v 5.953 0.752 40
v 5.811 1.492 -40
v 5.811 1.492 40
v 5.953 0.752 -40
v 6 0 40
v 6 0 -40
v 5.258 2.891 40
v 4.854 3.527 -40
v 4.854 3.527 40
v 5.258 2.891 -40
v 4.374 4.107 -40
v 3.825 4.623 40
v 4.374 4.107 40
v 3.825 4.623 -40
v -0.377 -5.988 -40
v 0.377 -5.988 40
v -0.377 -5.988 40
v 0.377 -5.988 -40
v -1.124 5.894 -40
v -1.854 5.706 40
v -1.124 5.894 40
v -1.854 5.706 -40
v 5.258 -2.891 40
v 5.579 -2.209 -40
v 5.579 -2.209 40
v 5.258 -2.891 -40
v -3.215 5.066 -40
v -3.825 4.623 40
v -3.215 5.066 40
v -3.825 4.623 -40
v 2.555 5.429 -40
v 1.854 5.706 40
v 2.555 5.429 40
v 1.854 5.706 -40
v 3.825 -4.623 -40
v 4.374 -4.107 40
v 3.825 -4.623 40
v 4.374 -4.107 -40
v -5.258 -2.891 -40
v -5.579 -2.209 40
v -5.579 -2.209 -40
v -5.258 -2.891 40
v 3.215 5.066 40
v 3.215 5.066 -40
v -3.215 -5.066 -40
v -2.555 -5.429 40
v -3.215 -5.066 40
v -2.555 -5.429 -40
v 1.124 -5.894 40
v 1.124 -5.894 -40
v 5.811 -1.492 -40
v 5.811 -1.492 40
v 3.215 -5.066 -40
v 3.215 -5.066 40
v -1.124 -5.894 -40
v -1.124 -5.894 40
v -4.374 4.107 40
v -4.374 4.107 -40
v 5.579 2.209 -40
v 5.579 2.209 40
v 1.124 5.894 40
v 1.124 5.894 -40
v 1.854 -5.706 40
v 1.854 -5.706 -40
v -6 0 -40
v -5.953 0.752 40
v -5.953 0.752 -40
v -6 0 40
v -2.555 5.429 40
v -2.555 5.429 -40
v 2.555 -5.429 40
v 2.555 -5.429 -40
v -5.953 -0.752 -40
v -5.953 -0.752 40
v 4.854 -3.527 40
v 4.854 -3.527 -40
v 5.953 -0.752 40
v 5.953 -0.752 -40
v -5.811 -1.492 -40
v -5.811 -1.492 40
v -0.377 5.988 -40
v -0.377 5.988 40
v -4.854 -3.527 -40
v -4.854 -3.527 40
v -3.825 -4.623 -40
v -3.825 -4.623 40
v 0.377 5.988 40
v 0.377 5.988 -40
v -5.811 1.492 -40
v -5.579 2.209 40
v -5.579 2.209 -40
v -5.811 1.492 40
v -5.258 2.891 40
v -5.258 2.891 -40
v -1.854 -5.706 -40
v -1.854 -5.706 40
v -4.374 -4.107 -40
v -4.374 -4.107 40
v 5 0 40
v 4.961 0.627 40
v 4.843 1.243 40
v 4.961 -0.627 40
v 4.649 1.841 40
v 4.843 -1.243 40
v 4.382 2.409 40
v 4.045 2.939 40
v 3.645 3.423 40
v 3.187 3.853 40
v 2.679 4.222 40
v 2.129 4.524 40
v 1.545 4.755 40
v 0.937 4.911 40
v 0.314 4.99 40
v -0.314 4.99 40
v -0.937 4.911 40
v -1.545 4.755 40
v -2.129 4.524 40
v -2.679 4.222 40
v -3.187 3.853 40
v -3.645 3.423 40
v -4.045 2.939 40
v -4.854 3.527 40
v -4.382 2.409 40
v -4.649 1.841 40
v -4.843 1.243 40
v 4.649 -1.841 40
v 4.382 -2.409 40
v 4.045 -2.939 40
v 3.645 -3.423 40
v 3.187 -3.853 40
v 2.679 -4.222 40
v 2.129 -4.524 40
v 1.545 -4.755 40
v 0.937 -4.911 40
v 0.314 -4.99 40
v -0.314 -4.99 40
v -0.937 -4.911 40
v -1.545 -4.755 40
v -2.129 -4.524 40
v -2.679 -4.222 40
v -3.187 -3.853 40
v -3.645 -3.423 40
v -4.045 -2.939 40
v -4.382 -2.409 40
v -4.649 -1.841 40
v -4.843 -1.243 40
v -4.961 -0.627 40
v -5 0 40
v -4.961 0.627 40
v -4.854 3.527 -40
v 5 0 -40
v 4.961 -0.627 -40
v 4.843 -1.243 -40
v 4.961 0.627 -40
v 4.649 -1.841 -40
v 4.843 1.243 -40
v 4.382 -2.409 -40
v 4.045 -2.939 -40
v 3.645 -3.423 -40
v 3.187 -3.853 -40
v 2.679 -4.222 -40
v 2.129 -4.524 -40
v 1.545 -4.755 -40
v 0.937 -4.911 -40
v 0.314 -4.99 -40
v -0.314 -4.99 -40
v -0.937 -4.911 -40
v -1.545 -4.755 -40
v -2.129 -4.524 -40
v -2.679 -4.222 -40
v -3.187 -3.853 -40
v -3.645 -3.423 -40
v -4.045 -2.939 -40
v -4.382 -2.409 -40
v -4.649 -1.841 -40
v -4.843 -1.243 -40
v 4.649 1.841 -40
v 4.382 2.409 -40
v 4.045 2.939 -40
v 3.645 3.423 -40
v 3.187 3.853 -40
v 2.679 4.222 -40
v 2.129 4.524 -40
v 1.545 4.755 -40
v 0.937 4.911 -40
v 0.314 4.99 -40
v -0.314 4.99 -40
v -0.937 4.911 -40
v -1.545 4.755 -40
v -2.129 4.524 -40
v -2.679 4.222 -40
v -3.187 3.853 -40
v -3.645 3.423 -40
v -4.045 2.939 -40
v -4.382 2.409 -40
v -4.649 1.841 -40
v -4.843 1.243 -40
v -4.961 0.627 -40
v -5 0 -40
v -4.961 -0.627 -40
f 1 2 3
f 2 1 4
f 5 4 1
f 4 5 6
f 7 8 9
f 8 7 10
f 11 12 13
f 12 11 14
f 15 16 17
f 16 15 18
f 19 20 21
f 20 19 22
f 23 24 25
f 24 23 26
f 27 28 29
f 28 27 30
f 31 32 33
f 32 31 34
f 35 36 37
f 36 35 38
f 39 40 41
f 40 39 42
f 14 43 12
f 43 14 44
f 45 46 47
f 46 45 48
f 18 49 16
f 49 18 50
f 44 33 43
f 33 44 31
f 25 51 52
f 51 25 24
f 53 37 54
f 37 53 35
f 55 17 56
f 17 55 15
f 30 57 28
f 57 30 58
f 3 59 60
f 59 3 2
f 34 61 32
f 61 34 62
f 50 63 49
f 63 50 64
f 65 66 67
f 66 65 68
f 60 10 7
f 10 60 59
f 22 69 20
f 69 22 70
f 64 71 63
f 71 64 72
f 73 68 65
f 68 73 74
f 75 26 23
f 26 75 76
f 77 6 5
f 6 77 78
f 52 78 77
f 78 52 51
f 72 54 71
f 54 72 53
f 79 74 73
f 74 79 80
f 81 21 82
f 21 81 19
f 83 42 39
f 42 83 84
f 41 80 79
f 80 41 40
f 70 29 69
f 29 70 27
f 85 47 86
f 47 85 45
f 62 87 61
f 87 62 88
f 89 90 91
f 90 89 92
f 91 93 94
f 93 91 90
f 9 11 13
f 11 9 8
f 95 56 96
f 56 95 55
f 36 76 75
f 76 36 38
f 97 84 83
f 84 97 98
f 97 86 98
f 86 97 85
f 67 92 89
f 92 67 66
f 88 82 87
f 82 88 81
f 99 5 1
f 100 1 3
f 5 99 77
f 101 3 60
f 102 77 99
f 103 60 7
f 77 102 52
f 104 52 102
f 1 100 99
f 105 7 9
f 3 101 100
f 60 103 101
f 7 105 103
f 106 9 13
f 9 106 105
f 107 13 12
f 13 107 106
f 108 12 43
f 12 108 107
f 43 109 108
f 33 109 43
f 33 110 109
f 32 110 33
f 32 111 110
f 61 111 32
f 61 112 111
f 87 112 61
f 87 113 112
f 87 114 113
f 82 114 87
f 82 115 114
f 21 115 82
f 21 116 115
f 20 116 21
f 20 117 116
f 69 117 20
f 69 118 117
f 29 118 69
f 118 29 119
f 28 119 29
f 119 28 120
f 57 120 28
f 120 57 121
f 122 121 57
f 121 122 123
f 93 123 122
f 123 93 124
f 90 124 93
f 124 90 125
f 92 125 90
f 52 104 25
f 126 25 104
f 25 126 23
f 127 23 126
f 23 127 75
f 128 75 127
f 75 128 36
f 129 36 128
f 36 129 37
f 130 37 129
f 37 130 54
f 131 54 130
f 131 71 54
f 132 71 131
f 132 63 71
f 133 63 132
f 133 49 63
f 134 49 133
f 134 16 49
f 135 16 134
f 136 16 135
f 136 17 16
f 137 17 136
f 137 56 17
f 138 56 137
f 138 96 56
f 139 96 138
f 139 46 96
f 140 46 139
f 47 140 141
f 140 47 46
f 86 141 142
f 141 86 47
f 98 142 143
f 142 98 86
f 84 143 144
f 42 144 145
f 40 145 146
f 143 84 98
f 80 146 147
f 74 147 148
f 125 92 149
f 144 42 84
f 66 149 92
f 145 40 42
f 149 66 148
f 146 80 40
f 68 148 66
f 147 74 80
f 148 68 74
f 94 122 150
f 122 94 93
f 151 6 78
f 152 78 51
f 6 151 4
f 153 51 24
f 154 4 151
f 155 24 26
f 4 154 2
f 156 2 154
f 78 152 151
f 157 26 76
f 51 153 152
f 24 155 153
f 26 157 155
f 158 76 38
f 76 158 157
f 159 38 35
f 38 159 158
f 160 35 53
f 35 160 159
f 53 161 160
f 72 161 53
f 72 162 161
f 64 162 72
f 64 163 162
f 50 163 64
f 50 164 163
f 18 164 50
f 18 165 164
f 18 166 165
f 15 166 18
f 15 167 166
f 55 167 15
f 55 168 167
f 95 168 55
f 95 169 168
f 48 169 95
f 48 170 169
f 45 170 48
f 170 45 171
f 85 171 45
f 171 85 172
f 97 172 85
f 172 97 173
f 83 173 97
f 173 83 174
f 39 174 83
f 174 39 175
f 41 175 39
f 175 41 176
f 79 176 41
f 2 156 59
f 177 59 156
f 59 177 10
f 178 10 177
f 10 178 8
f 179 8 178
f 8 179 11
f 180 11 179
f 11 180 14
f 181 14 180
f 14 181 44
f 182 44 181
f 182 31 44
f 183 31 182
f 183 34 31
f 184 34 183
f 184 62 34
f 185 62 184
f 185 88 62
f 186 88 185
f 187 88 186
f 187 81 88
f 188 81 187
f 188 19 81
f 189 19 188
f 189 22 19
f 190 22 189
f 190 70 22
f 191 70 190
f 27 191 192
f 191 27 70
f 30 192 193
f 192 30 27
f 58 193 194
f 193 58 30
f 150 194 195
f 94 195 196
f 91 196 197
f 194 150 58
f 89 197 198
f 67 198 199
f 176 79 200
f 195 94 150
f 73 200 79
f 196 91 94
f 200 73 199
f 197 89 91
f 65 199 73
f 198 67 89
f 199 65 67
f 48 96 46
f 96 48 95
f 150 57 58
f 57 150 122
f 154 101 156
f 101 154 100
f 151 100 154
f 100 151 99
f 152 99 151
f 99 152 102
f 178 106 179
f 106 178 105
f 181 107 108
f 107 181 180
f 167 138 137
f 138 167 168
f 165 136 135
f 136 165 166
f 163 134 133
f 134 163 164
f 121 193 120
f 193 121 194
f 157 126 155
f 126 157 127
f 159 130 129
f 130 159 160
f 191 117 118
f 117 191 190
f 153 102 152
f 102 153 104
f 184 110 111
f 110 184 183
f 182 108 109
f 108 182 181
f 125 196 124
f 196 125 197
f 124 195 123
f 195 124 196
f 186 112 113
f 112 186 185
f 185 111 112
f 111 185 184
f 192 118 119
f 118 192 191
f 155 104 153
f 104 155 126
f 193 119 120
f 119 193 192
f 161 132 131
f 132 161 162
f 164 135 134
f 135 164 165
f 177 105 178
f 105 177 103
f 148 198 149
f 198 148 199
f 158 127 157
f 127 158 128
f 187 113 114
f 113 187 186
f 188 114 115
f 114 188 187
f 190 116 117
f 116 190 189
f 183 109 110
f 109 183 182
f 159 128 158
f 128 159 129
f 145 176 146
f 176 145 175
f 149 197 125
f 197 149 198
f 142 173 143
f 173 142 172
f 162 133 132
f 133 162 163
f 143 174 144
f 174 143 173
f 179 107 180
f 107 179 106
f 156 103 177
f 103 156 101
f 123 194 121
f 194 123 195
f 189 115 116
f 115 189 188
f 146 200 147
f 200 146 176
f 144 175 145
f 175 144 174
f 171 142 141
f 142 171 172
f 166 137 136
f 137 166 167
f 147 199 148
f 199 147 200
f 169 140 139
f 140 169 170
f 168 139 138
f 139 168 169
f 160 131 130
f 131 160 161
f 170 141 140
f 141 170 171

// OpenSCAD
$fn = 50;


difference() {
	union() {
		translate(v = [0, 0, -40.0000000000]) {
			cylinder(h = 80, r = 6.0000000000);
		}
	}
	union() {
		translate(v = [0, 0, -100.0000000000]) {
			cylinder(h = 200, r = 5.0000000000);
		}
	}
}
